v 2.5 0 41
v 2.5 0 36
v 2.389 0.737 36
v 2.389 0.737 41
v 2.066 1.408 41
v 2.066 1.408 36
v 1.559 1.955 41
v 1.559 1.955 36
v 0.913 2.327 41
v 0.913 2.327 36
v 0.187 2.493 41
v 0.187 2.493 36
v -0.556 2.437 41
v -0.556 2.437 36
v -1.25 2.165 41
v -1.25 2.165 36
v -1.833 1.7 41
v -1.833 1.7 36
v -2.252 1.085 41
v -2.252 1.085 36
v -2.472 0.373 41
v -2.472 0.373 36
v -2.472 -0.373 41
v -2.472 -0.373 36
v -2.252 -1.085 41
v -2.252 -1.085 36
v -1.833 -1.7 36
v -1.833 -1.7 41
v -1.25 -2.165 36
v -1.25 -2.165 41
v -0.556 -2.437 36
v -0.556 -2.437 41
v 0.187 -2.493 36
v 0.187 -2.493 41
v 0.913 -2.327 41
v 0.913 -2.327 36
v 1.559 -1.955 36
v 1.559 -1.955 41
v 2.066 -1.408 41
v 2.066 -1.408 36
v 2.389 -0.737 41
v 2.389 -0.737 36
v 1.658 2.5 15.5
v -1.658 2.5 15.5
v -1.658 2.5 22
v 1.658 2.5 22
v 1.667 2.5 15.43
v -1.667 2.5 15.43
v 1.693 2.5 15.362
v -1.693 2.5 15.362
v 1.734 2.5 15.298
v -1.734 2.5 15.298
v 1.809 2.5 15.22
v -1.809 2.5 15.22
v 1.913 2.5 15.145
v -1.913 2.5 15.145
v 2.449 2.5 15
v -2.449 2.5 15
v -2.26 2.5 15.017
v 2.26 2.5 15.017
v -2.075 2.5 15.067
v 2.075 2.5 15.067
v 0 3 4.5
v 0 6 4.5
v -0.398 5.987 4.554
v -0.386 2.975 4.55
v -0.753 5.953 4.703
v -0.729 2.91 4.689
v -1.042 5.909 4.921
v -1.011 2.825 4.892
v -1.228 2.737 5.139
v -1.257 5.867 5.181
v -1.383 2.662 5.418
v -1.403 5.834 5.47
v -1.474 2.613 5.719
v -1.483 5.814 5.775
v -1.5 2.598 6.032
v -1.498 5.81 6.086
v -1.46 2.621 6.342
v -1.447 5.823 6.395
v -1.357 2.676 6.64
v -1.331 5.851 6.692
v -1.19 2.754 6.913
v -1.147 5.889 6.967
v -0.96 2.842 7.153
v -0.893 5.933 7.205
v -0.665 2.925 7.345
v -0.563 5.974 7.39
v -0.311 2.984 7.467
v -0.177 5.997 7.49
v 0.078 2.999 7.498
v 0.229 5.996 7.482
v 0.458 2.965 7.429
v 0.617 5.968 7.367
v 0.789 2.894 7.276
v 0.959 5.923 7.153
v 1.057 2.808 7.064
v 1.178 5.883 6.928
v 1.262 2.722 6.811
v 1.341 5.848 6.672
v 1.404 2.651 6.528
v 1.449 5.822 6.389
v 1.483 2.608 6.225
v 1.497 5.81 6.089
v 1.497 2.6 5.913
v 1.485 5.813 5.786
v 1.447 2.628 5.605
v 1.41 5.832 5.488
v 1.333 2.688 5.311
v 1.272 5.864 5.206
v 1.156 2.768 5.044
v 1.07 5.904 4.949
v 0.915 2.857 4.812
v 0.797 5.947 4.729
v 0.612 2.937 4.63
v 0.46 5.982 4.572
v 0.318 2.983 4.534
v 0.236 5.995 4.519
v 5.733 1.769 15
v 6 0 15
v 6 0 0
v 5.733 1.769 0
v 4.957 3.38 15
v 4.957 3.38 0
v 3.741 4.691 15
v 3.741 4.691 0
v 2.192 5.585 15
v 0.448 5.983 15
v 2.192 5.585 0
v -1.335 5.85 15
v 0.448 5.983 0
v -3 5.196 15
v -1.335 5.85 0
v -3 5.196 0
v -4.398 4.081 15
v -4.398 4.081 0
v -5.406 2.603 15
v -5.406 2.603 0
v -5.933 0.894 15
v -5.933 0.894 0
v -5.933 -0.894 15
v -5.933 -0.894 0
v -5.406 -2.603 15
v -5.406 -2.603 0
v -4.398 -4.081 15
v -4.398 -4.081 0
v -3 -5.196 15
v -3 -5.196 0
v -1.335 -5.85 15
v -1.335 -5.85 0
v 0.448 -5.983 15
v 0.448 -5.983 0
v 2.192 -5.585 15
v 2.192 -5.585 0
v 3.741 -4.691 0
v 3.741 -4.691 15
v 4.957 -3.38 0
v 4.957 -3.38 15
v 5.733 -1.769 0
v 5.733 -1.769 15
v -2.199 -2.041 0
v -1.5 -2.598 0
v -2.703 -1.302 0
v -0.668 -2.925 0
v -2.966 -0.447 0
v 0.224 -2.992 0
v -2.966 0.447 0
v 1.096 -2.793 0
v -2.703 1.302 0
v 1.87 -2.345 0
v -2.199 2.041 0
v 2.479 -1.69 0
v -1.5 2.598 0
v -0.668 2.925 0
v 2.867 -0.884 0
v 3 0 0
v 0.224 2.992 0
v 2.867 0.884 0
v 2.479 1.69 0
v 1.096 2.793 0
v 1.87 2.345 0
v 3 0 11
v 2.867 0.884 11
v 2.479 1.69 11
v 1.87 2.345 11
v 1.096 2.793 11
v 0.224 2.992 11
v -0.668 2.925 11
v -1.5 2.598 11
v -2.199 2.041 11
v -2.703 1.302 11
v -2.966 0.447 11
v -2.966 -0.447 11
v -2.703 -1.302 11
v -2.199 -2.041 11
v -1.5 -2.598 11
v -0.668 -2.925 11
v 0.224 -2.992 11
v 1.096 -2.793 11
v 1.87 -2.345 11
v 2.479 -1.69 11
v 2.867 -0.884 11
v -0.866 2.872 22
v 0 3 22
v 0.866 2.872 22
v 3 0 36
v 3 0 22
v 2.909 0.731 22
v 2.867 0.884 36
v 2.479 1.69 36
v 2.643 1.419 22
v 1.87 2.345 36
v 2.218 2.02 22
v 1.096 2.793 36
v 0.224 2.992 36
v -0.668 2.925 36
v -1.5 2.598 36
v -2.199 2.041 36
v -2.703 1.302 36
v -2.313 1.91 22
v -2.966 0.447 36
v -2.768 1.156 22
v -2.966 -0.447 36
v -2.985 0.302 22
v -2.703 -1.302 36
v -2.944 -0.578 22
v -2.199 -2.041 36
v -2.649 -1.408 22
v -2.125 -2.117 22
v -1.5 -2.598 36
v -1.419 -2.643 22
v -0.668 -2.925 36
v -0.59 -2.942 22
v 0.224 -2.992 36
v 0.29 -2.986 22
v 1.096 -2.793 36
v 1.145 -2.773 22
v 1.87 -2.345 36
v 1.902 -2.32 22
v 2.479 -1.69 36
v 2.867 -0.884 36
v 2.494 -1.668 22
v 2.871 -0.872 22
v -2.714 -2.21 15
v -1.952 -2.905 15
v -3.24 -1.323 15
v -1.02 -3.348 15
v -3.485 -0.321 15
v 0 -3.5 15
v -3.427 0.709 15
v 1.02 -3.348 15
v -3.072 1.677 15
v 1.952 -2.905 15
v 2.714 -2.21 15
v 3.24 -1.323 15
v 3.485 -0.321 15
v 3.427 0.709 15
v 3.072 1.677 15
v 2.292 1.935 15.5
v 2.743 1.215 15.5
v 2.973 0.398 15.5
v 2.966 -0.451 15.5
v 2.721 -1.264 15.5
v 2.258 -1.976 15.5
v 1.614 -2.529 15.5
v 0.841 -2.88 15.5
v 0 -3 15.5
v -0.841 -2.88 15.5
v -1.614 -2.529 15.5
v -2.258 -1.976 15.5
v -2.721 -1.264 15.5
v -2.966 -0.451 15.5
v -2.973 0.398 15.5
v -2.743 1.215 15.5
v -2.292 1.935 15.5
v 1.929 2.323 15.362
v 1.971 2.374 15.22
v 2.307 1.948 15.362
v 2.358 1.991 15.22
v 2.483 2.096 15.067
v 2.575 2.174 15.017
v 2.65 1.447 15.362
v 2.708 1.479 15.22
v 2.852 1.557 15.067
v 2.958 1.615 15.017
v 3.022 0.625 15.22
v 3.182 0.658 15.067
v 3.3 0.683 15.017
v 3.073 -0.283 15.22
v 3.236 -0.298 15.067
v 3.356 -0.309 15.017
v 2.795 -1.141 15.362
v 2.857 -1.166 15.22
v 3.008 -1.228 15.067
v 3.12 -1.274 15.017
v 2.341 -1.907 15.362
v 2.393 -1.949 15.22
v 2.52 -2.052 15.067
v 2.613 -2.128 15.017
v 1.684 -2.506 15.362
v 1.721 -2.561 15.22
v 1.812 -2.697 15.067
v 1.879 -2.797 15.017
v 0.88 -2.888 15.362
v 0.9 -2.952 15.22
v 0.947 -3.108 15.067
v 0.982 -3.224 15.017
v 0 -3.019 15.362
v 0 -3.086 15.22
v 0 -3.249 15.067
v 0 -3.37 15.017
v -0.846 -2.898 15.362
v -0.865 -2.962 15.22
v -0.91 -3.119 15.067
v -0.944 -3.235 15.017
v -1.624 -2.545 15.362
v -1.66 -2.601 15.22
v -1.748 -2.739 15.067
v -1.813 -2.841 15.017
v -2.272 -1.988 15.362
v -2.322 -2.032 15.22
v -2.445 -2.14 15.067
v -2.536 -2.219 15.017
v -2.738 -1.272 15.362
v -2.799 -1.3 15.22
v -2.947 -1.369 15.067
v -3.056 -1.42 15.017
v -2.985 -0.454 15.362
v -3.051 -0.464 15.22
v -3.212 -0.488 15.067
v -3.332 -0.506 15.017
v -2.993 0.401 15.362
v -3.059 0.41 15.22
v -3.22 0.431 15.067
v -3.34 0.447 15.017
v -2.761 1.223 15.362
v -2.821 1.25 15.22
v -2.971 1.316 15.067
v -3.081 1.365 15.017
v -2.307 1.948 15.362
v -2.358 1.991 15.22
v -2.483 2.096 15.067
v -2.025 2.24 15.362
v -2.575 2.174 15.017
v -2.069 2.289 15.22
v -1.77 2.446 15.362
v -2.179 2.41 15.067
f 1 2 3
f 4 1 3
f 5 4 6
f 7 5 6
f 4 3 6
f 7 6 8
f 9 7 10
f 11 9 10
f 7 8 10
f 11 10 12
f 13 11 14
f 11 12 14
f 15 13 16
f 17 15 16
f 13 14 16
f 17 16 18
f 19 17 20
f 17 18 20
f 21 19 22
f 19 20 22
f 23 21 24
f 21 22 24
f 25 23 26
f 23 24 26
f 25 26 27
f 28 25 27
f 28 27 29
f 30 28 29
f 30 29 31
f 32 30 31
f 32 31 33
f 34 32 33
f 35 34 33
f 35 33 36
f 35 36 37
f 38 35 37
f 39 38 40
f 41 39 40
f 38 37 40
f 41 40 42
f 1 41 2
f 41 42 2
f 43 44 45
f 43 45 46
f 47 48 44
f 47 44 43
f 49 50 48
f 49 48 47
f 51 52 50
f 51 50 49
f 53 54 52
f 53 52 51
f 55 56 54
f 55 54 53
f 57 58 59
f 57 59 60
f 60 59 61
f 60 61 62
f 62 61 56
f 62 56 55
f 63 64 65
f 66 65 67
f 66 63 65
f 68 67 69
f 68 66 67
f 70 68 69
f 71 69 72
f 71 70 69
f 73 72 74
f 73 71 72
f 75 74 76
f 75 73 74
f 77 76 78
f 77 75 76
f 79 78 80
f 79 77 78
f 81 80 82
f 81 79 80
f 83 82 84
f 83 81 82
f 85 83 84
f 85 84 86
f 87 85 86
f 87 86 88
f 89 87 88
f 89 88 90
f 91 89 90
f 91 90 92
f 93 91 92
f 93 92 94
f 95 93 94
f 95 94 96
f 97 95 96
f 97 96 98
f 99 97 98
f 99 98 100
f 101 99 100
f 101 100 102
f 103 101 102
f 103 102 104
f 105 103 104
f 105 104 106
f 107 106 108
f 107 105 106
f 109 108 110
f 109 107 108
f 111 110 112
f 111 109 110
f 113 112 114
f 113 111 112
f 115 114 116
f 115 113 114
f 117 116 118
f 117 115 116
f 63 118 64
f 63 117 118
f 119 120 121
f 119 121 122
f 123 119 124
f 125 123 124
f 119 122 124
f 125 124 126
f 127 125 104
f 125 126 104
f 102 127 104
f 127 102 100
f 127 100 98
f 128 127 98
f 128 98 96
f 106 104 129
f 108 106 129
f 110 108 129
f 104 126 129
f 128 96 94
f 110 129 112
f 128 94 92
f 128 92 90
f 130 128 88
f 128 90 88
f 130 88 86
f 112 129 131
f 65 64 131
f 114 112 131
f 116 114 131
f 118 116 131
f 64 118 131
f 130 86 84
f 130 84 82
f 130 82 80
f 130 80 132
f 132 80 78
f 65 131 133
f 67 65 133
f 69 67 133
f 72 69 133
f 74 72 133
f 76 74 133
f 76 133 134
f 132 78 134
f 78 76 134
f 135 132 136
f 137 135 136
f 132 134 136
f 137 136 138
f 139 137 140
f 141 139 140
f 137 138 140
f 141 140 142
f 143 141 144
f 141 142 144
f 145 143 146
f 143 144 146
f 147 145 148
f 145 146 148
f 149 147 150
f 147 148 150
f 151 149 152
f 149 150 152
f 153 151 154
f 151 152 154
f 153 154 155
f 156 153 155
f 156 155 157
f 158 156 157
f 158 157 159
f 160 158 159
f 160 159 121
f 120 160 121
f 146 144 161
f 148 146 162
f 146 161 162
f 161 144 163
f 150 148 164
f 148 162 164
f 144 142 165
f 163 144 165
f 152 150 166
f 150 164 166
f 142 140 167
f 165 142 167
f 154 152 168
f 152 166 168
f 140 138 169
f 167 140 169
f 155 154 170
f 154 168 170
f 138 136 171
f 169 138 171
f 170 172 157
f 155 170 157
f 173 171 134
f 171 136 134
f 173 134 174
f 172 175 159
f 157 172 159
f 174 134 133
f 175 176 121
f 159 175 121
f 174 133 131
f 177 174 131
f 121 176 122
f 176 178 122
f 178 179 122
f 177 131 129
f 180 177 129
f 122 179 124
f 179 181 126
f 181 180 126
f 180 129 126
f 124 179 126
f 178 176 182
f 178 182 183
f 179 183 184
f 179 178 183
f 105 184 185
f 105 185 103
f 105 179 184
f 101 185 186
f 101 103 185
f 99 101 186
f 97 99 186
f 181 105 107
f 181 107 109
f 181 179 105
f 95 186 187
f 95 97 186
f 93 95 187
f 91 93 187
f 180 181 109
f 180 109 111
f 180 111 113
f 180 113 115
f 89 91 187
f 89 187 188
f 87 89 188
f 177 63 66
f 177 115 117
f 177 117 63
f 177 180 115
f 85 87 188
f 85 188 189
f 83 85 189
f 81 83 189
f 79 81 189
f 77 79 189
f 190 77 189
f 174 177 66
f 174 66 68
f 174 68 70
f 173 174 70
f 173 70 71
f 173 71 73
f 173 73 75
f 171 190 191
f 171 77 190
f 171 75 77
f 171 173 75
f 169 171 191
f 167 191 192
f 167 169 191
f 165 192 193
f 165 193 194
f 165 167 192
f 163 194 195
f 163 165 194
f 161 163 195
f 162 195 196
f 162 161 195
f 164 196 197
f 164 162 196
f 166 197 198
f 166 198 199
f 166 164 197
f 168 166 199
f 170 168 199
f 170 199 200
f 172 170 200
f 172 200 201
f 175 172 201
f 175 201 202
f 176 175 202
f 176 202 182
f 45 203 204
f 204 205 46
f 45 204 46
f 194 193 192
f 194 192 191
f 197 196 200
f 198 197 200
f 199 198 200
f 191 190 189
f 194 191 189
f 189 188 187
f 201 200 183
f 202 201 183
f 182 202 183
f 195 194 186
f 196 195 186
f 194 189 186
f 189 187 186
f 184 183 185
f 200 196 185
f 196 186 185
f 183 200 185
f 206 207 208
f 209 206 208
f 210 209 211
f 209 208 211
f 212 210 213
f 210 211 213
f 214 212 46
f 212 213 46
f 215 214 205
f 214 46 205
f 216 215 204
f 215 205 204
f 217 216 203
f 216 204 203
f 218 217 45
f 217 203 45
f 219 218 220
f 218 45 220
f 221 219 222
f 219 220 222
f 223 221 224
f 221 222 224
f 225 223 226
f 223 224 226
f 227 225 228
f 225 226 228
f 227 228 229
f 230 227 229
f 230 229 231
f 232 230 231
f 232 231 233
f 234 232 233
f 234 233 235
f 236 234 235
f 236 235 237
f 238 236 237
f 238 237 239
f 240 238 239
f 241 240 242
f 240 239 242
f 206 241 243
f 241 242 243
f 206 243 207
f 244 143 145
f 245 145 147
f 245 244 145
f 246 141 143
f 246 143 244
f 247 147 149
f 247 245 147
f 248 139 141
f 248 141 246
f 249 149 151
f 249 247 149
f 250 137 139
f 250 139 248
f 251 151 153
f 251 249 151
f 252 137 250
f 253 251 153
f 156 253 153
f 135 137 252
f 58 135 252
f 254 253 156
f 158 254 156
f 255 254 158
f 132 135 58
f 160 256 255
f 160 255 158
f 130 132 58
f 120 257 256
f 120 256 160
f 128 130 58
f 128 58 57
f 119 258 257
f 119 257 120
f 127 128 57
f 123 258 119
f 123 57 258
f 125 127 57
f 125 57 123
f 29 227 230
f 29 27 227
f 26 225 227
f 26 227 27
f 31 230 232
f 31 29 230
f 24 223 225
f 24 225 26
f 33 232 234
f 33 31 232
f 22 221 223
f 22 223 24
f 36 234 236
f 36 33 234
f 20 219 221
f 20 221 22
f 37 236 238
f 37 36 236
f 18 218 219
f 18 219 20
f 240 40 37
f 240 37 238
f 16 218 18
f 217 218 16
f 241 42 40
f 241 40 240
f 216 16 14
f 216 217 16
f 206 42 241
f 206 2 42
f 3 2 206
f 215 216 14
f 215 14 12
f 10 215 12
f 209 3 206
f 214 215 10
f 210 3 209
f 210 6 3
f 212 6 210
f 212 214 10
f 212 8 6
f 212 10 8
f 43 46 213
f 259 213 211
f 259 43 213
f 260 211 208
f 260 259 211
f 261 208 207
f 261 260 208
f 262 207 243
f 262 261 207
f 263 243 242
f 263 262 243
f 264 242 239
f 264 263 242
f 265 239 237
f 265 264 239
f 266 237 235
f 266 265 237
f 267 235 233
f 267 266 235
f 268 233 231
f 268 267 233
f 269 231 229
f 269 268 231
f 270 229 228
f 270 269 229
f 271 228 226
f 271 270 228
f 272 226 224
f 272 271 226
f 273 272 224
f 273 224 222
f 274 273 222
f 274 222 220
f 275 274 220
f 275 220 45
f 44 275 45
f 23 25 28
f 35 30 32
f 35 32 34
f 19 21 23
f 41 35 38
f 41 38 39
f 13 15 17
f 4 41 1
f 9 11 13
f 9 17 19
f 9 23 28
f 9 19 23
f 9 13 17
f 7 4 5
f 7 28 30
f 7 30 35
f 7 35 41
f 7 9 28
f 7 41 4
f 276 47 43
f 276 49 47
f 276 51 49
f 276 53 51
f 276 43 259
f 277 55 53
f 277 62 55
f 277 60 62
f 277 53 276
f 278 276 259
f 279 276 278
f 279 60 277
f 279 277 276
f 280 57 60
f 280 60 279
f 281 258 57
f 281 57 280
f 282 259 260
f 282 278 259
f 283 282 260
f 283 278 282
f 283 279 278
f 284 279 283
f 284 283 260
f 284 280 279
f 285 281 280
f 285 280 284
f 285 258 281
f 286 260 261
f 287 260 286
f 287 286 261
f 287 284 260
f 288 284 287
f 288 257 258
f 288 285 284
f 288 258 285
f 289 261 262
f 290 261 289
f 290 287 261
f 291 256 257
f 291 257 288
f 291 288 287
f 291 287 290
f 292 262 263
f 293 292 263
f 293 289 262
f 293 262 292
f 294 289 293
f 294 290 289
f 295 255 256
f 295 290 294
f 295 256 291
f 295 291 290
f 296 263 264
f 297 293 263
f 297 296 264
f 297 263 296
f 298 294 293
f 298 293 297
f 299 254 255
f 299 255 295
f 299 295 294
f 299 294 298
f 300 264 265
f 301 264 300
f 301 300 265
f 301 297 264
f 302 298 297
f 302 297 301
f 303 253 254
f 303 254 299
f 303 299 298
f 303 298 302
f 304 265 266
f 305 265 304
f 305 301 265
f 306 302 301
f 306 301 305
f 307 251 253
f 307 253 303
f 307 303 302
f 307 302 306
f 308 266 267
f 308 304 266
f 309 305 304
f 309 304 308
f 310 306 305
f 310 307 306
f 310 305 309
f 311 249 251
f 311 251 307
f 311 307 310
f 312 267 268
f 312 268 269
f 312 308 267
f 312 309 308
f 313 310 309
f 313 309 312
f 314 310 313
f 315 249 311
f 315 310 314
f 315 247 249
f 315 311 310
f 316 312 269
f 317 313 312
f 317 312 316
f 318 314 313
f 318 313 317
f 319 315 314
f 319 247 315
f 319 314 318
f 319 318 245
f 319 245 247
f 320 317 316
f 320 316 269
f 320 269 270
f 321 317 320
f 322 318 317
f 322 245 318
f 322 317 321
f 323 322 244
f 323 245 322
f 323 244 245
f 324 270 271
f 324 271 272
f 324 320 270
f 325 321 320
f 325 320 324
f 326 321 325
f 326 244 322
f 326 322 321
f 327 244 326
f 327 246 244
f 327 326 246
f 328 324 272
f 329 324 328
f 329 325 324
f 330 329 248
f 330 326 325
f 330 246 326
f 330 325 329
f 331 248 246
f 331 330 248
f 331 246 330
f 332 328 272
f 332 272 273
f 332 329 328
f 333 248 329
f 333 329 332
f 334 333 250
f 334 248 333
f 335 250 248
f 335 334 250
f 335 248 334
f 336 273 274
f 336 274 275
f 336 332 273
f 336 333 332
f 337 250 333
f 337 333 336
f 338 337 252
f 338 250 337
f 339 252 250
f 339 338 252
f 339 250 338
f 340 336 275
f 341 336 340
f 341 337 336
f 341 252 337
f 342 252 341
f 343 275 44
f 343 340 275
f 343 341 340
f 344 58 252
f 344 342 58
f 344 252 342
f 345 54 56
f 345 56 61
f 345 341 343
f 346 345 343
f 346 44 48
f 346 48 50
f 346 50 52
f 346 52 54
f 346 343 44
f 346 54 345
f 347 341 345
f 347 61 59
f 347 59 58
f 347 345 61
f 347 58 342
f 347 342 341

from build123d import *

# Parameters (mm, degrees)
SKETCH1_R           = 6
SKETCH1_R_2         = 3
BOSS_EXTRUDE1_DEPTH = 11
SKETCH2_R           = 1.5
CUT_EXTRUDE1_DEPTH  = 14.892443989
SKETCH3_R           = 6
BOSS_EXTRUDE2_DEPTH = 4
BOSS_EXTRUDE3_DEPTH = 7
SKETCH5_R           = 3
BOSS_EXTRUDE6_DEPTH = 14
SKETCH7_R           = 2.5
BOSS_EXTRUDE7_DEPTH = 5
FILLET1_R           = 0.5


with BuildPart() as part:
    # Sketch1 → Boss-Extrude1 (new body)
    with BuildSketch(Plane.XY):
        Circle(SKETCH1_R)
        Circle(SKETCH1_R_2, mode=Mode.SUBTRACT)
    extrude(amount=BOSS_EXTRUDE1_DEPTH)

    # Sketch2 → Cut-Extrude1 (cut, through all)
    with BuildSketch(Plane(origin=(0, 0, 0), x_dir=(1, 0, 0), z_dir=(0, 1, 0))):
        with Locations(Location((0, -6, 0), (0, 0, 90))):
            Circle(SKETCH2_R)
    extrude(amount=CUT_EXTRUDE1_DEPTH, mode=Mode.SUBTRACT)

    # Sketch3 → Boss-Extrude2 (add)
    with BuildSketch(Plane.XY.offset(11)):
        Circle(SKETCH3_R)
    extrude(amount=BOSS_EXTRUDE2_DEPTH)

    # Sketch4 → Boss-Extrude3 (add)
    with BuildSketch(Plane.XY.offset(15)):
        with BuildLine():
            Line((-1.658312395, 2.5), (1.658312395, 2.5))
            ThreePointArc((1.658312395, 2.5), (0, -3), (-1.658312395, 2.5))
        make_face()
    extrude(amount=BOSS_EXTRUDE3_DEPTH)

    # Sketch5 → Boss-Extrude6 (add)
    with BuildSketch(Plane.XY.offset(22)):
        Circle(SKETCH5_R)
    extrude(amount=BOSS_EXTRUDE6_DEPTH)

    # Sketch7 → Boss-Extrude7 (add)
    with BuildSketch(Plane.XY.offset(36)):
        Circle(SKETCH7_R)
    extrude(amount=BOSS_EXTRUDE7_DEPTH)

    # Fillet1
    fillet1_edges = [part.edges().sort_by_distance(p)[0] for p in [
        (0, -3, 15),
    ]]
    fillet(fillet1_edges, radius=FILLET1_R)


solid = part.part
